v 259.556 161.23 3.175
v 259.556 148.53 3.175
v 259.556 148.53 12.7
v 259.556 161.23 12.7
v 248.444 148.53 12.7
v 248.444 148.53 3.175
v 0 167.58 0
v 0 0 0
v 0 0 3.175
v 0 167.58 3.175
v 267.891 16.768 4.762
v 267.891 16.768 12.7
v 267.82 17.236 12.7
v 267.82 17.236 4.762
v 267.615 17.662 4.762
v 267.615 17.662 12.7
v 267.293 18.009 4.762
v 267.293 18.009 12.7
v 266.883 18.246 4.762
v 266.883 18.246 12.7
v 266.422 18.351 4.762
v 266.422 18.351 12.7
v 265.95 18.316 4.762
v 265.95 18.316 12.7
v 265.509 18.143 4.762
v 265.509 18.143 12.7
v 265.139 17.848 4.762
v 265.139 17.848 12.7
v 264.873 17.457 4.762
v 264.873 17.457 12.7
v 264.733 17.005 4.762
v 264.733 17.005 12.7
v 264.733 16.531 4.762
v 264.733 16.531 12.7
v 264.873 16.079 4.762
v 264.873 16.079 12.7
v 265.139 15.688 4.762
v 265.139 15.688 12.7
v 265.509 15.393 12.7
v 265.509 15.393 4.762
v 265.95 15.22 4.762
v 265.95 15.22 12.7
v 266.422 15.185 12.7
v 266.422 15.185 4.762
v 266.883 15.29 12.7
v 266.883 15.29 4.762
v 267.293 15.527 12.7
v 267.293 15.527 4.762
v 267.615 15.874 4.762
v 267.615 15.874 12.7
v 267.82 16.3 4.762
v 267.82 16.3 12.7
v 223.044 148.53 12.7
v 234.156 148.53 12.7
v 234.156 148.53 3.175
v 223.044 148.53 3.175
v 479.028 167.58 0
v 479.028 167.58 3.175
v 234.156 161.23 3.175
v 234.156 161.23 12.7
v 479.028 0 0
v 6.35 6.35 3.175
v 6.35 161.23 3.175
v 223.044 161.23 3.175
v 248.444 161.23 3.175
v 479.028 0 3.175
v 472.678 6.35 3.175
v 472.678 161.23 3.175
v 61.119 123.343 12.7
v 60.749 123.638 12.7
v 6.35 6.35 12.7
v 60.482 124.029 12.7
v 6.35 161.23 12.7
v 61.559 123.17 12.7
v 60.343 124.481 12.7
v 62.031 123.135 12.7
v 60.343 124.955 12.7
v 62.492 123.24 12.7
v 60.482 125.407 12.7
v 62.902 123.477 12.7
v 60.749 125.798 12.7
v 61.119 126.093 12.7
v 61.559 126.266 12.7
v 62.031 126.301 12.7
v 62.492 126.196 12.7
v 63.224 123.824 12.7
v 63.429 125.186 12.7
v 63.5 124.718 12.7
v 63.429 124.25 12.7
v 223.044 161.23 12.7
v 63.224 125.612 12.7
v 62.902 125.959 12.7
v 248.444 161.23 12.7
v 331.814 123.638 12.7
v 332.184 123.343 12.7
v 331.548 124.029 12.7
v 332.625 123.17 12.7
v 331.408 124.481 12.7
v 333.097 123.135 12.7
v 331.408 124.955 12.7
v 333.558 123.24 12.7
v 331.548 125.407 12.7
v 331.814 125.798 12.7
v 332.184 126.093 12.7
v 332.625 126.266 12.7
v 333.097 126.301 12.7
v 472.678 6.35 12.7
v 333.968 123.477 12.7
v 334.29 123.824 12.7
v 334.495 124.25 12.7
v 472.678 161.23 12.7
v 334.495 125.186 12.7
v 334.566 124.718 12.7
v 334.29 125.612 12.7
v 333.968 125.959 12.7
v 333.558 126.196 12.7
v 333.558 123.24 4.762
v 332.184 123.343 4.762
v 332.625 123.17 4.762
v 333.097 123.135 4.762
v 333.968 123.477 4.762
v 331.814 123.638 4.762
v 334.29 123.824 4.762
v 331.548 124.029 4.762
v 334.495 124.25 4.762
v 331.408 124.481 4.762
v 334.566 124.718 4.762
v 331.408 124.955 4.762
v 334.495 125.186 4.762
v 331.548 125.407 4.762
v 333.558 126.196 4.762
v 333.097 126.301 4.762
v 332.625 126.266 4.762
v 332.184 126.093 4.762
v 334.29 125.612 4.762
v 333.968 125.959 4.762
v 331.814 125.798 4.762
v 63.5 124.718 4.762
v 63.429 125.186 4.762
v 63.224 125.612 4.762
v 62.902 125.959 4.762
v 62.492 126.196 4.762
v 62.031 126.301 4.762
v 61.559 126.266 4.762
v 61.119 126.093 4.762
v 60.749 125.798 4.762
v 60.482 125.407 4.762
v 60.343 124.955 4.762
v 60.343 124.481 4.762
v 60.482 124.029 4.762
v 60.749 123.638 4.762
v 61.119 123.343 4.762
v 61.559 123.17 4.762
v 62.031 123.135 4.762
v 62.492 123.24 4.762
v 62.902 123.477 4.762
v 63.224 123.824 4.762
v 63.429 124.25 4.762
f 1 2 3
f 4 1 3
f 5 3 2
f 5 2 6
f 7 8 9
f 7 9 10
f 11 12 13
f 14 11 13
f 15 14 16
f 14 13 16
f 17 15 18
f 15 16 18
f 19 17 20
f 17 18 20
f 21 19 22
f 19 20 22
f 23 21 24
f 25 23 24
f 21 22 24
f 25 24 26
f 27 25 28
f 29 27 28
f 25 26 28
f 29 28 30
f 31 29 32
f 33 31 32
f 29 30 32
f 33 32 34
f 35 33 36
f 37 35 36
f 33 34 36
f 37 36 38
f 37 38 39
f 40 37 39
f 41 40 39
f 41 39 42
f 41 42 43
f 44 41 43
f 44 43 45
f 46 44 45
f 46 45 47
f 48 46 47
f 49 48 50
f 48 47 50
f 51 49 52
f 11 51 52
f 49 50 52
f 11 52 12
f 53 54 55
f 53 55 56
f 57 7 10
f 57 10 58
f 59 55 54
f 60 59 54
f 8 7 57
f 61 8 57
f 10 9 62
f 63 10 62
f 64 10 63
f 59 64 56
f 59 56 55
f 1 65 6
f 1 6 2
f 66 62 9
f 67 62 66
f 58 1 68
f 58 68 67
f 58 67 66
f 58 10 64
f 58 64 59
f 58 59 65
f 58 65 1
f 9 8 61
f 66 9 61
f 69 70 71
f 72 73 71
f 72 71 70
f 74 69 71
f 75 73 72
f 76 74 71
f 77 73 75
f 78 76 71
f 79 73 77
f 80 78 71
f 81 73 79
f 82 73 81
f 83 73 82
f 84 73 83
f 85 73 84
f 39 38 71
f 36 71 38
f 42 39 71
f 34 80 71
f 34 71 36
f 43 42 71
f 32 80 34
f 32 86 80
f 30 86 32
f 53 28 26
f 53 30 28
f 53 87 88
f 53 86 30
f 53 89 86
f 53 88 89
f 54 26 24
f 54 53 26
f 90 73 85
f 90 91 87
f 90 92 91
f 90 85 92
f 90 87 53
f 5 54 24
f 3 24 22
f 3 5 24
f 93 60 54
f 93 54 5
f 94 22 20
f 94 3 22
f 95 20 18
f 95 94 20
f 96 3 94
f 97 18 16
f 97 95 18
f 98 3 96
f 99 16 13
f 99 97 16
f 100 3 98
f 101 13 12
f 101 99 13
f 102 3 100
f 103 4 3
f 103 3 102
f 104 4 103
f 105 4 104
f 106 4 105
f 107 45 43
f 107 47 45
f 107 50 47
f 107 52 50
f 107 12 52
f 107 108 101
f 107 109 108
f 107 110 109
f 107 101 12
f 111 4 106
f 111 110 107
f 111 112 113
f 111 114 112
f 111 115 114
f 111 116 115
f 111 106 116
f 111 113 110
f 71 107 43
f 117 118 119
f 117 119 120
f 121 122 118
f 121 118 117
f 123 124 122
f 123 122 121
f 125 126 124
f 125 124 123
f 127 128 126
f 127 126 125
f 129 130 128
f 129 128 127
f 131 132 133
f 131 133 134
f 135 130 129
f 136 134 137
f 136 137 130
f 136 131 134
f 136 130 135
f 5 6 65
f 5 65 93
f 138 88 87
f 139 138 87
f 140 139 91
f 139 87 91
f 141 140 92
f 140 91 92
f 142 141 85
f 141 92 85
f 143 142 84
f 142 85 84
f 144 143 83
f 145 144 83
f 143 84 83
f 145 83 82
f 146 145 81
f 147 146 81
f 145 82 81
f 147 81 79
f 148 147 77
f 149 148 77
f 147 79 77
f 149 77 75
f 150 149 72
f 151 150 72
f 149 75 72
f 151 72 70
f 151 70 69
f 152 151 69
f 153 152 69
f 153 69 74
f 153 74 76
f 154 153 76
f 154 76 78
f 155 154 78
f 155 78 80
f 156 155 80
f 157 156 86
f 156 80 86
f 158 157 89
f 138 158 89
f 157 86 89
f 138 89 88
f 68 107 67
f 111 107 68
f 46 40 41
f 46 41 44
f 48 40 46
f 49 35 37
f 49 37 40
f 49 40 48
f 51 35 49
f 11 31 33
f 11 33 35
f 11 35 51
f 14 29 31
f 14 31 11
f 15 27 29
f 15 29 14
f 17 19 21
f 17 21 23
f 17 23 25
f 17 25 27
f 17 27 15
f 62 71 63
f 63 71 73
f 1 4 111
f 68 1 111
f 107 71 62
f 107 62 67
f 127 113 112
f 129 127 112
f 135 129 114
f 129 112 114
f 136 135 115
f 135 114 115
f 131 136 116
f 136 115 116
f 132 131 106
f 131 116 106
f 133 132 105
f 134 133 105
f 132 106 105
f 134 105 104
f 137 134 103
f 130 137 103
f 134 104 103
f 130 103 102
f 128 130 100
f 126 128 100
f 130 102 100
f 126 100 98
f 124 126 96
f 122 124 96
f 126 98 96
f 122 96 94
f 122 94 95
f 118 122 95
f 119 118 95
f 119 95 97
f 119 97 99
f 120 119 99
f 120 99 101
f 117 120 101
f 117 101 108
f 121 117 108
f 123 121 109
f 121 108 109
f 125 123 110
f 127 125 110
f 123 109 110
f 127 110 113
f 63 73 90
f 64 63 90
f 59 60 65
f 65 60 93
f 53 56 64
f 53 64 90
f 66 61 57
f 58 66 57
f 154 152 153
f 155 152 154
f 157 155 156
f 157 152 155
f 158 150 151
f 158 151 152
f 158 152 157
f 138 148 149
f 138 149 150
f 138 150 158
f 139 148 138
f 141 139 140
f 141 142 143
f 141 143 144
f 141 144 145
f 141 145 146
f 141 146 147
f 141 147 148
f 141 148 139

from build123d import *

# Parameters (mm, degrees)
F0_W     = 479.028125
F0_H     = 167.580469
F1_DEPTH = 12.7
F2_W     = 479.028125
F2_H     = 167.580469
F2_W_2   = 466.328125
F2_H_2   = 154.880469
F3_DEPTH = 9.525
F4_W     = 11.1125
F4_H     = 9.525
F5_DEPTH = 19.05
F6_R     = 1.5875
F7_DEPTH = 7.9375


with BuildPart() as f1:
    # F0 (on Top) → F1 (new body)
    with BuildSketch(Plane.XY):
        with Locations((239.514062, 83.790234)):
            Rectangle(F0_W, F0_H)
    extrude(amount=F1_DEPTH)

    # F2 (on face) → F3 (cut)
    with BuildSketch(Plane.XY.offset(12.7)):
        with Locations((239.514062, 83.790234)):
            Rectangle(F2_W, F2_H)
        with Locations((239.514062, 83.790234)):
            Rectangle(F2_W_2, F2_H_2, mode=Mode.SUBTRACT)
    extrude(amount=-F3_DEPTH, mode=Mode.SUBTRACT)

    # F4 (on face) → F5 (cut)
    with BuildSketch(Plane(origin=(0, 167.580469, 0), x_dir=(-1, 0, 0), z_dir=(0, 1, 0))):
        with Locations((-228.6, 7.9375)):
            Rectangle(F4_W, F4_H)
        with Locations((-254, 7.9375)):
            Rectangle(F4_W, F4_H)
    extrude(amount=-F5_DEPTH, mode=Mode.SUBTRACT)

    # F6 (on face) → F7 (cut)
    with BuildSketch(Plane.XY.offset(12.7)):
        with Locations((61.9125, 124.717969)):
            Circle(F6_R)
        with Locations((332.978125, 124.717969)):
            Circle(F6_R)
        with Locations((266.303125, 16.767969)):
            Circle(F6_R)
    extrude(amount=-F7_DEPTH, mode=Mode.SUBTRACT)


solid = f1.part
